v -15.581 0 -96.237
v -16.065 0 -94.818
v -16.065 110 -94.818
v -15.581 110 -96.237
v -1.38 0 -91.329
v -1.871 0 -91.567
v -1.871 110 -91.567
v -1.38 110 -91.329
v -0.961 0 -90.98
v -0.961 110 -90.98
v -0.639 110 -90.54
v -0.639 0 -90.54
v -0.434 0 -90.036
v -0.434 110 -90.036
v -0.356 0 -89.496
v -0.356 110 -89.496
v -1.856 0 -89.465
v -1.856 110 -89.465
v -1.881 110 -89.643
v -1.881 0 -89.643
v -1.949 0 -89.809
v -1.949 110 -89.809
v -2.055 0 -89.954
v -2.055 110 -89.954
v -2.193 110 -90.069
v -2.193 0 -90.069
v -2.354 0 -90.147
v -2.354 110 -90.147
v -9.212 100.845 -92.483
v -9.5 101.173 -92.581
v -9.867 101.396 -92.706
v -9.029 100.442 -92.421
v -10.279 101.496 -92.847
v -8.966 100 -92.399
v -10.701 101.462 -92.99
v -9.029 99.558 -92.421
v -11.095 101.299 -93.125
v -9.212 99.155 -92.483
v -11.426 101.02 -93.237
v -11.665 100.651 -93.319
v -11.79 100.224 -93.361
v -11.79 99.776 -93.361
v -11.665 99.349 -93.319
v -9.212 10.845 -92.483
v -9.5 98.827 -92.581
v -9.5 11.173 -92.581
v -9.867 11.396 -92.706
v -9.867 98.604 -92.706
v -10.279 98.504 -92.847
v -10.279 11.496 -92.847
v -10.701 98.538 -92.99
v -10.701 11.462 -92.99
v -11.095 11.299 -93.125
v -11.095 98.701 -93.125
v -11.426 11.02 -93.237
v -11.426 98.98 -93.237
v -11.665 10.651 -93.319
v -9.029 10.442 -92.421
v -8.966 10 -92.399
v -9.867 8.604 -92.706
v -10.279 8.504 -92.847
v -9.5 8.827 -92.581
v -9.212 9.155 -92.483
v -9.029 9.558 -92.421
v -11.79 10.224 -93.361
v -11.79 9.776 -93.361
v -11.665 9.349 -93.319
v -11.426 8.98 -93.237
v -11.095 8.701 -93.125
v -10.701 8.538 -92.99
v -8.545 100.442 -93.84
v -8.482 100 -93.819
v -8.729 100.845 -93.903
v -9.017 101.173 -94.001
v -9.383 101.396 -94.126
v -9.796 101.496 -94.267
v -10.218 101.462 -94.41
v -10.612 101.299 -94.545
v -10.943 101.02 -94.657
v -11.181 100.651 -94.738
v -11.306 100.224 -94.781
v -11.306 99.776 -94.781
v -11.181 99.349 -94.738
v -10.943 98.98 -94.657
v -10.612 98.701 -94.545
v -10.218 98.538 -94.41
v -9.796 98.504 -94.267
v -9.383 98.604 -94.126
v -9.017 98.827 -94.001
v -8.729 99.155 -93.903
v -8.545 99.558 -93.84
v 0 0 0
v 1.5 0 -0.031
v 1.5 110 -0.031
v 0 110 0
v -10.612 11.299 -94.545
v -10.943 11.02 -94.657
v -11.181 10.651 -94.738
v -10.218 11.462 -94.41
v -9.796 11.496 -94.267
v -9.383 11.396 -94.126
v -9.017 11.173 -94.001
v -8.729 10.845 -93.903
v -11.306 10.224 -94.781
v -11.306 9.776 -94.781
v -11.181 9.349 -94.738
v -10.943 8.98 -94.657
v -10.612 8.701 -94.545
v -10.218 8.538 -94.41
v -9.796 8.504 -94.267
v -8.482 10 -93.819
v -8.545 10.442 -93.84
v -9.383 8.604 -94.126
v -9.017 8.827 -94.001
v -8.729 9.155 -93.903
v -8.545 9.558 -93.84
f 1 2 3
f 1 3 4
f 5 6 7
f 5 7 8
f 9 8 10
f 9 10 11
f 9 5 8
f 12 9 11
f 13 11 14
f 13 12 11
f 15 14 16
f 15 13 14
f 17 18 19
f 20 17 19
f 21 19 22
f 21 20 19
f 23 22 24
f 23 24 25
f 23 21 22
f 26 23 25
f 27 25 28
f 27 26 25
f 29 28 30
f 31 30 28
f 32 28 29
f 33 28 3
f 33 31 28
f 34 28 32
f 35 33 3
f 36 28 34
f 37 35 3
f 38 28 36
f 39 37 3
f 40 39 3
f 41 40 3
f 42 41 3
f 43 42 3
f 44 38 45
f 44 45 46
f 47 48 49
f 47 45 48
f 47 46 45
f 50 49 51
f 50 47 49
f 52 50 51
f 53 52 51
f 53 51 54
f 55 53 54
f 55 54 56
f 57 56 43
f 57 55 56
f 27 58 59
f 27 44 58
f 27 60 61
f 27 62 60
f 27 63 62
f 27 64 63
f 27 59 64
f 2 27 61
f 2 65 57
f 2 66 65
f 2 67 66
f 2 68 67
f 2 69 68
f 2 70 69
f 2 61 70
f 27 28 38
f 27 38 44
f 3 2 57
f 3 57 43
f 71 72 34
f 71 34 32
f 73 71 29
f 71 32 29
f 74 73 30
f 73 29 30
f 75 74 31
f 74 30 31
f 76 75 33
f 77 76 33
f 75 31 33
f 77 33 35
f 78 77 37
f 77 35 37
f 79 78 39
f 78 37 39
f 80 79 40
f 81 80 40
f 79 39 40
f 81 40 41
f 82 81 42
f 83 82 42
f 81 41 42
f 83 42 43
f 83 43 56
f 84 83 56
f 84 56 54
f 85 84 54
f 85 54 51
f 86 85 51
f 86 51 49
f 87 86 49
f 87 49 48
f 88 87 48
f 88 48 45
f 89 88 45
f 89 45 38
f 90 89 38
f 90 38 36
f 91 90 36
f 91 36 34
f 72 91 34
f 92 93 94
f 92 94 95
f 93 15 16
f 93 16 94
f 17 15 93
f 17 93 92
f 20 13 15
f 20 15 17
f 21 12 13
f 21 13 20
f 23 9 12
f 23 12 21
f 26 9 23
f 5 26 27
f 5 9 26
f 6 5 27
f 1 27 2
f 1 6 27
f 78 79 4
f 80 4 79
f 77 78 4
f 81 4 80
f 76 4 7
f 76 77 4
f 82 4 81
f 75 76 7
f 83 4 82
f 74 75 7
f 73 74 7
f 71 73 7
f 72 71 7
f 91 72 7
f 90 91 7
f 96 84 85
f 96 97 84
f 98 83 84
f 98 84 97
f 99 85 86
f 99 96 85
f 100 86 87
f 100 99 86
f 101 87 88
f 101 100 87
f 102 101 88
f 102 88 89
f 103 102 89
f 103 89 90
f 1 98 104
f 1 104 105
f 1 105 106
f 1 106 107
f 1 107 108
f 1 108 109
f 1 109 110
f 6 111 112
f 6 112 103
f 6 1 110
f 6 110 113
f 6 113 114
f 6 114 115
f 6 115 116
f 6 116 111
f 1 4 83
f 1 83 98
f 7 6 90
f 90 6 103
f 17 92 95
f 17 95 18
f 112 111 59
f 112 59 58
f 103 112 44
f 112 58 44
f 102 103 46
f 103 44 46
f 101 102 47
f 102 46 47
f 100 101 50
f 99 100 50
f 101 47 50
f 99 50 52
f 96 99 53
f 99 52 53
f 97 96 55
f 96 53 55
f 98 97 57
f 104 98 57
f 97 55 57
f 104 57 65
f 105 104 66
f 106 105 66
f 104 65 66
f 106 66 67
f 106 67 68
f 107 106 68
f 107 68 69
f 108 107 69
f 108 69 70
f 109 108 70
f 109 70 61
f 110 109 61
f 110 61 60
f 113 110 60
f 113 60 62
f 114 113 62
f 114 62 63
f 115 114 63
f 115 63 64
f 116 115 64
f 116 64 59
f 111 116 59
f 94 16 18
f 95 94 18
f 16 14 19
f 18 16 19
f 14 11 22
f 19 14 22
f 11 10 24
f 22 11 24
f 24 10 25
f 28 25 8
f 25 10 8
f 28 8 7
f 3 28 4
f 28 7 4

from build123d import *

# Parameters (mm, degrees)
BASE_FLANGE1_DEPTH          = 110
F_3_0MM_PRESS_DOWEL_HOLE1_D = 3


# Sheet-metal steps are written as plain solids
with BuildPart() as part:
    # Sketch1 → Base-Flange1 (new body)
    with BuildSketch(Plane(origin=(0, 0, 0), x_dir=(1, 0, 0), z_dir=(0, 1, 0))):
        with BuildLine():
            Line((0, 0), (-1.855570085, 89.464986247))
            ThreePointArc((-1.855570085, 89.464986247), (-1.99751505, 89.884629471), (-2.354487023, 90.146964789))
            Line((-2.354487023, 90.146964789), (-16.065007208, 94.817561297))
            Line((-16.065007208, 94.817561297), (-15.5813159, 96.237435489))
            Line((-15.5813159, 96.237435489), (-1.870795715, 91.56683898))
            ThreePointArc((-1.870795715, 91.56683898), (-0.786891948, 90.770288381), (-0.355892615, 89.496090669))
            Line((-0.355892615, 89.496090669), (1.49967747, 0.031104422))
            Line((1.49967747, 0.031104422), (0, 0))
        make_face()
    extrude(amount=BASE_FLANGE1_DEPTH)

    # Ø3.0mm Press Dowel Hole1 (through all)
    with Locations(Plane(origin=(27.754960473, 0, -81.474592183), x_dir=(-0.9465827940969574, 0, -0.32246087192029516), z_dir=(0.32246087192029516, 0, -0.9465827940969574))):
        with Locations((39.781812899, 10), (39.781812899, 100)):
            Hole(F_3_0MM_PRESS_DOWEL_HOLE1_D / 2)


solid = part.part
